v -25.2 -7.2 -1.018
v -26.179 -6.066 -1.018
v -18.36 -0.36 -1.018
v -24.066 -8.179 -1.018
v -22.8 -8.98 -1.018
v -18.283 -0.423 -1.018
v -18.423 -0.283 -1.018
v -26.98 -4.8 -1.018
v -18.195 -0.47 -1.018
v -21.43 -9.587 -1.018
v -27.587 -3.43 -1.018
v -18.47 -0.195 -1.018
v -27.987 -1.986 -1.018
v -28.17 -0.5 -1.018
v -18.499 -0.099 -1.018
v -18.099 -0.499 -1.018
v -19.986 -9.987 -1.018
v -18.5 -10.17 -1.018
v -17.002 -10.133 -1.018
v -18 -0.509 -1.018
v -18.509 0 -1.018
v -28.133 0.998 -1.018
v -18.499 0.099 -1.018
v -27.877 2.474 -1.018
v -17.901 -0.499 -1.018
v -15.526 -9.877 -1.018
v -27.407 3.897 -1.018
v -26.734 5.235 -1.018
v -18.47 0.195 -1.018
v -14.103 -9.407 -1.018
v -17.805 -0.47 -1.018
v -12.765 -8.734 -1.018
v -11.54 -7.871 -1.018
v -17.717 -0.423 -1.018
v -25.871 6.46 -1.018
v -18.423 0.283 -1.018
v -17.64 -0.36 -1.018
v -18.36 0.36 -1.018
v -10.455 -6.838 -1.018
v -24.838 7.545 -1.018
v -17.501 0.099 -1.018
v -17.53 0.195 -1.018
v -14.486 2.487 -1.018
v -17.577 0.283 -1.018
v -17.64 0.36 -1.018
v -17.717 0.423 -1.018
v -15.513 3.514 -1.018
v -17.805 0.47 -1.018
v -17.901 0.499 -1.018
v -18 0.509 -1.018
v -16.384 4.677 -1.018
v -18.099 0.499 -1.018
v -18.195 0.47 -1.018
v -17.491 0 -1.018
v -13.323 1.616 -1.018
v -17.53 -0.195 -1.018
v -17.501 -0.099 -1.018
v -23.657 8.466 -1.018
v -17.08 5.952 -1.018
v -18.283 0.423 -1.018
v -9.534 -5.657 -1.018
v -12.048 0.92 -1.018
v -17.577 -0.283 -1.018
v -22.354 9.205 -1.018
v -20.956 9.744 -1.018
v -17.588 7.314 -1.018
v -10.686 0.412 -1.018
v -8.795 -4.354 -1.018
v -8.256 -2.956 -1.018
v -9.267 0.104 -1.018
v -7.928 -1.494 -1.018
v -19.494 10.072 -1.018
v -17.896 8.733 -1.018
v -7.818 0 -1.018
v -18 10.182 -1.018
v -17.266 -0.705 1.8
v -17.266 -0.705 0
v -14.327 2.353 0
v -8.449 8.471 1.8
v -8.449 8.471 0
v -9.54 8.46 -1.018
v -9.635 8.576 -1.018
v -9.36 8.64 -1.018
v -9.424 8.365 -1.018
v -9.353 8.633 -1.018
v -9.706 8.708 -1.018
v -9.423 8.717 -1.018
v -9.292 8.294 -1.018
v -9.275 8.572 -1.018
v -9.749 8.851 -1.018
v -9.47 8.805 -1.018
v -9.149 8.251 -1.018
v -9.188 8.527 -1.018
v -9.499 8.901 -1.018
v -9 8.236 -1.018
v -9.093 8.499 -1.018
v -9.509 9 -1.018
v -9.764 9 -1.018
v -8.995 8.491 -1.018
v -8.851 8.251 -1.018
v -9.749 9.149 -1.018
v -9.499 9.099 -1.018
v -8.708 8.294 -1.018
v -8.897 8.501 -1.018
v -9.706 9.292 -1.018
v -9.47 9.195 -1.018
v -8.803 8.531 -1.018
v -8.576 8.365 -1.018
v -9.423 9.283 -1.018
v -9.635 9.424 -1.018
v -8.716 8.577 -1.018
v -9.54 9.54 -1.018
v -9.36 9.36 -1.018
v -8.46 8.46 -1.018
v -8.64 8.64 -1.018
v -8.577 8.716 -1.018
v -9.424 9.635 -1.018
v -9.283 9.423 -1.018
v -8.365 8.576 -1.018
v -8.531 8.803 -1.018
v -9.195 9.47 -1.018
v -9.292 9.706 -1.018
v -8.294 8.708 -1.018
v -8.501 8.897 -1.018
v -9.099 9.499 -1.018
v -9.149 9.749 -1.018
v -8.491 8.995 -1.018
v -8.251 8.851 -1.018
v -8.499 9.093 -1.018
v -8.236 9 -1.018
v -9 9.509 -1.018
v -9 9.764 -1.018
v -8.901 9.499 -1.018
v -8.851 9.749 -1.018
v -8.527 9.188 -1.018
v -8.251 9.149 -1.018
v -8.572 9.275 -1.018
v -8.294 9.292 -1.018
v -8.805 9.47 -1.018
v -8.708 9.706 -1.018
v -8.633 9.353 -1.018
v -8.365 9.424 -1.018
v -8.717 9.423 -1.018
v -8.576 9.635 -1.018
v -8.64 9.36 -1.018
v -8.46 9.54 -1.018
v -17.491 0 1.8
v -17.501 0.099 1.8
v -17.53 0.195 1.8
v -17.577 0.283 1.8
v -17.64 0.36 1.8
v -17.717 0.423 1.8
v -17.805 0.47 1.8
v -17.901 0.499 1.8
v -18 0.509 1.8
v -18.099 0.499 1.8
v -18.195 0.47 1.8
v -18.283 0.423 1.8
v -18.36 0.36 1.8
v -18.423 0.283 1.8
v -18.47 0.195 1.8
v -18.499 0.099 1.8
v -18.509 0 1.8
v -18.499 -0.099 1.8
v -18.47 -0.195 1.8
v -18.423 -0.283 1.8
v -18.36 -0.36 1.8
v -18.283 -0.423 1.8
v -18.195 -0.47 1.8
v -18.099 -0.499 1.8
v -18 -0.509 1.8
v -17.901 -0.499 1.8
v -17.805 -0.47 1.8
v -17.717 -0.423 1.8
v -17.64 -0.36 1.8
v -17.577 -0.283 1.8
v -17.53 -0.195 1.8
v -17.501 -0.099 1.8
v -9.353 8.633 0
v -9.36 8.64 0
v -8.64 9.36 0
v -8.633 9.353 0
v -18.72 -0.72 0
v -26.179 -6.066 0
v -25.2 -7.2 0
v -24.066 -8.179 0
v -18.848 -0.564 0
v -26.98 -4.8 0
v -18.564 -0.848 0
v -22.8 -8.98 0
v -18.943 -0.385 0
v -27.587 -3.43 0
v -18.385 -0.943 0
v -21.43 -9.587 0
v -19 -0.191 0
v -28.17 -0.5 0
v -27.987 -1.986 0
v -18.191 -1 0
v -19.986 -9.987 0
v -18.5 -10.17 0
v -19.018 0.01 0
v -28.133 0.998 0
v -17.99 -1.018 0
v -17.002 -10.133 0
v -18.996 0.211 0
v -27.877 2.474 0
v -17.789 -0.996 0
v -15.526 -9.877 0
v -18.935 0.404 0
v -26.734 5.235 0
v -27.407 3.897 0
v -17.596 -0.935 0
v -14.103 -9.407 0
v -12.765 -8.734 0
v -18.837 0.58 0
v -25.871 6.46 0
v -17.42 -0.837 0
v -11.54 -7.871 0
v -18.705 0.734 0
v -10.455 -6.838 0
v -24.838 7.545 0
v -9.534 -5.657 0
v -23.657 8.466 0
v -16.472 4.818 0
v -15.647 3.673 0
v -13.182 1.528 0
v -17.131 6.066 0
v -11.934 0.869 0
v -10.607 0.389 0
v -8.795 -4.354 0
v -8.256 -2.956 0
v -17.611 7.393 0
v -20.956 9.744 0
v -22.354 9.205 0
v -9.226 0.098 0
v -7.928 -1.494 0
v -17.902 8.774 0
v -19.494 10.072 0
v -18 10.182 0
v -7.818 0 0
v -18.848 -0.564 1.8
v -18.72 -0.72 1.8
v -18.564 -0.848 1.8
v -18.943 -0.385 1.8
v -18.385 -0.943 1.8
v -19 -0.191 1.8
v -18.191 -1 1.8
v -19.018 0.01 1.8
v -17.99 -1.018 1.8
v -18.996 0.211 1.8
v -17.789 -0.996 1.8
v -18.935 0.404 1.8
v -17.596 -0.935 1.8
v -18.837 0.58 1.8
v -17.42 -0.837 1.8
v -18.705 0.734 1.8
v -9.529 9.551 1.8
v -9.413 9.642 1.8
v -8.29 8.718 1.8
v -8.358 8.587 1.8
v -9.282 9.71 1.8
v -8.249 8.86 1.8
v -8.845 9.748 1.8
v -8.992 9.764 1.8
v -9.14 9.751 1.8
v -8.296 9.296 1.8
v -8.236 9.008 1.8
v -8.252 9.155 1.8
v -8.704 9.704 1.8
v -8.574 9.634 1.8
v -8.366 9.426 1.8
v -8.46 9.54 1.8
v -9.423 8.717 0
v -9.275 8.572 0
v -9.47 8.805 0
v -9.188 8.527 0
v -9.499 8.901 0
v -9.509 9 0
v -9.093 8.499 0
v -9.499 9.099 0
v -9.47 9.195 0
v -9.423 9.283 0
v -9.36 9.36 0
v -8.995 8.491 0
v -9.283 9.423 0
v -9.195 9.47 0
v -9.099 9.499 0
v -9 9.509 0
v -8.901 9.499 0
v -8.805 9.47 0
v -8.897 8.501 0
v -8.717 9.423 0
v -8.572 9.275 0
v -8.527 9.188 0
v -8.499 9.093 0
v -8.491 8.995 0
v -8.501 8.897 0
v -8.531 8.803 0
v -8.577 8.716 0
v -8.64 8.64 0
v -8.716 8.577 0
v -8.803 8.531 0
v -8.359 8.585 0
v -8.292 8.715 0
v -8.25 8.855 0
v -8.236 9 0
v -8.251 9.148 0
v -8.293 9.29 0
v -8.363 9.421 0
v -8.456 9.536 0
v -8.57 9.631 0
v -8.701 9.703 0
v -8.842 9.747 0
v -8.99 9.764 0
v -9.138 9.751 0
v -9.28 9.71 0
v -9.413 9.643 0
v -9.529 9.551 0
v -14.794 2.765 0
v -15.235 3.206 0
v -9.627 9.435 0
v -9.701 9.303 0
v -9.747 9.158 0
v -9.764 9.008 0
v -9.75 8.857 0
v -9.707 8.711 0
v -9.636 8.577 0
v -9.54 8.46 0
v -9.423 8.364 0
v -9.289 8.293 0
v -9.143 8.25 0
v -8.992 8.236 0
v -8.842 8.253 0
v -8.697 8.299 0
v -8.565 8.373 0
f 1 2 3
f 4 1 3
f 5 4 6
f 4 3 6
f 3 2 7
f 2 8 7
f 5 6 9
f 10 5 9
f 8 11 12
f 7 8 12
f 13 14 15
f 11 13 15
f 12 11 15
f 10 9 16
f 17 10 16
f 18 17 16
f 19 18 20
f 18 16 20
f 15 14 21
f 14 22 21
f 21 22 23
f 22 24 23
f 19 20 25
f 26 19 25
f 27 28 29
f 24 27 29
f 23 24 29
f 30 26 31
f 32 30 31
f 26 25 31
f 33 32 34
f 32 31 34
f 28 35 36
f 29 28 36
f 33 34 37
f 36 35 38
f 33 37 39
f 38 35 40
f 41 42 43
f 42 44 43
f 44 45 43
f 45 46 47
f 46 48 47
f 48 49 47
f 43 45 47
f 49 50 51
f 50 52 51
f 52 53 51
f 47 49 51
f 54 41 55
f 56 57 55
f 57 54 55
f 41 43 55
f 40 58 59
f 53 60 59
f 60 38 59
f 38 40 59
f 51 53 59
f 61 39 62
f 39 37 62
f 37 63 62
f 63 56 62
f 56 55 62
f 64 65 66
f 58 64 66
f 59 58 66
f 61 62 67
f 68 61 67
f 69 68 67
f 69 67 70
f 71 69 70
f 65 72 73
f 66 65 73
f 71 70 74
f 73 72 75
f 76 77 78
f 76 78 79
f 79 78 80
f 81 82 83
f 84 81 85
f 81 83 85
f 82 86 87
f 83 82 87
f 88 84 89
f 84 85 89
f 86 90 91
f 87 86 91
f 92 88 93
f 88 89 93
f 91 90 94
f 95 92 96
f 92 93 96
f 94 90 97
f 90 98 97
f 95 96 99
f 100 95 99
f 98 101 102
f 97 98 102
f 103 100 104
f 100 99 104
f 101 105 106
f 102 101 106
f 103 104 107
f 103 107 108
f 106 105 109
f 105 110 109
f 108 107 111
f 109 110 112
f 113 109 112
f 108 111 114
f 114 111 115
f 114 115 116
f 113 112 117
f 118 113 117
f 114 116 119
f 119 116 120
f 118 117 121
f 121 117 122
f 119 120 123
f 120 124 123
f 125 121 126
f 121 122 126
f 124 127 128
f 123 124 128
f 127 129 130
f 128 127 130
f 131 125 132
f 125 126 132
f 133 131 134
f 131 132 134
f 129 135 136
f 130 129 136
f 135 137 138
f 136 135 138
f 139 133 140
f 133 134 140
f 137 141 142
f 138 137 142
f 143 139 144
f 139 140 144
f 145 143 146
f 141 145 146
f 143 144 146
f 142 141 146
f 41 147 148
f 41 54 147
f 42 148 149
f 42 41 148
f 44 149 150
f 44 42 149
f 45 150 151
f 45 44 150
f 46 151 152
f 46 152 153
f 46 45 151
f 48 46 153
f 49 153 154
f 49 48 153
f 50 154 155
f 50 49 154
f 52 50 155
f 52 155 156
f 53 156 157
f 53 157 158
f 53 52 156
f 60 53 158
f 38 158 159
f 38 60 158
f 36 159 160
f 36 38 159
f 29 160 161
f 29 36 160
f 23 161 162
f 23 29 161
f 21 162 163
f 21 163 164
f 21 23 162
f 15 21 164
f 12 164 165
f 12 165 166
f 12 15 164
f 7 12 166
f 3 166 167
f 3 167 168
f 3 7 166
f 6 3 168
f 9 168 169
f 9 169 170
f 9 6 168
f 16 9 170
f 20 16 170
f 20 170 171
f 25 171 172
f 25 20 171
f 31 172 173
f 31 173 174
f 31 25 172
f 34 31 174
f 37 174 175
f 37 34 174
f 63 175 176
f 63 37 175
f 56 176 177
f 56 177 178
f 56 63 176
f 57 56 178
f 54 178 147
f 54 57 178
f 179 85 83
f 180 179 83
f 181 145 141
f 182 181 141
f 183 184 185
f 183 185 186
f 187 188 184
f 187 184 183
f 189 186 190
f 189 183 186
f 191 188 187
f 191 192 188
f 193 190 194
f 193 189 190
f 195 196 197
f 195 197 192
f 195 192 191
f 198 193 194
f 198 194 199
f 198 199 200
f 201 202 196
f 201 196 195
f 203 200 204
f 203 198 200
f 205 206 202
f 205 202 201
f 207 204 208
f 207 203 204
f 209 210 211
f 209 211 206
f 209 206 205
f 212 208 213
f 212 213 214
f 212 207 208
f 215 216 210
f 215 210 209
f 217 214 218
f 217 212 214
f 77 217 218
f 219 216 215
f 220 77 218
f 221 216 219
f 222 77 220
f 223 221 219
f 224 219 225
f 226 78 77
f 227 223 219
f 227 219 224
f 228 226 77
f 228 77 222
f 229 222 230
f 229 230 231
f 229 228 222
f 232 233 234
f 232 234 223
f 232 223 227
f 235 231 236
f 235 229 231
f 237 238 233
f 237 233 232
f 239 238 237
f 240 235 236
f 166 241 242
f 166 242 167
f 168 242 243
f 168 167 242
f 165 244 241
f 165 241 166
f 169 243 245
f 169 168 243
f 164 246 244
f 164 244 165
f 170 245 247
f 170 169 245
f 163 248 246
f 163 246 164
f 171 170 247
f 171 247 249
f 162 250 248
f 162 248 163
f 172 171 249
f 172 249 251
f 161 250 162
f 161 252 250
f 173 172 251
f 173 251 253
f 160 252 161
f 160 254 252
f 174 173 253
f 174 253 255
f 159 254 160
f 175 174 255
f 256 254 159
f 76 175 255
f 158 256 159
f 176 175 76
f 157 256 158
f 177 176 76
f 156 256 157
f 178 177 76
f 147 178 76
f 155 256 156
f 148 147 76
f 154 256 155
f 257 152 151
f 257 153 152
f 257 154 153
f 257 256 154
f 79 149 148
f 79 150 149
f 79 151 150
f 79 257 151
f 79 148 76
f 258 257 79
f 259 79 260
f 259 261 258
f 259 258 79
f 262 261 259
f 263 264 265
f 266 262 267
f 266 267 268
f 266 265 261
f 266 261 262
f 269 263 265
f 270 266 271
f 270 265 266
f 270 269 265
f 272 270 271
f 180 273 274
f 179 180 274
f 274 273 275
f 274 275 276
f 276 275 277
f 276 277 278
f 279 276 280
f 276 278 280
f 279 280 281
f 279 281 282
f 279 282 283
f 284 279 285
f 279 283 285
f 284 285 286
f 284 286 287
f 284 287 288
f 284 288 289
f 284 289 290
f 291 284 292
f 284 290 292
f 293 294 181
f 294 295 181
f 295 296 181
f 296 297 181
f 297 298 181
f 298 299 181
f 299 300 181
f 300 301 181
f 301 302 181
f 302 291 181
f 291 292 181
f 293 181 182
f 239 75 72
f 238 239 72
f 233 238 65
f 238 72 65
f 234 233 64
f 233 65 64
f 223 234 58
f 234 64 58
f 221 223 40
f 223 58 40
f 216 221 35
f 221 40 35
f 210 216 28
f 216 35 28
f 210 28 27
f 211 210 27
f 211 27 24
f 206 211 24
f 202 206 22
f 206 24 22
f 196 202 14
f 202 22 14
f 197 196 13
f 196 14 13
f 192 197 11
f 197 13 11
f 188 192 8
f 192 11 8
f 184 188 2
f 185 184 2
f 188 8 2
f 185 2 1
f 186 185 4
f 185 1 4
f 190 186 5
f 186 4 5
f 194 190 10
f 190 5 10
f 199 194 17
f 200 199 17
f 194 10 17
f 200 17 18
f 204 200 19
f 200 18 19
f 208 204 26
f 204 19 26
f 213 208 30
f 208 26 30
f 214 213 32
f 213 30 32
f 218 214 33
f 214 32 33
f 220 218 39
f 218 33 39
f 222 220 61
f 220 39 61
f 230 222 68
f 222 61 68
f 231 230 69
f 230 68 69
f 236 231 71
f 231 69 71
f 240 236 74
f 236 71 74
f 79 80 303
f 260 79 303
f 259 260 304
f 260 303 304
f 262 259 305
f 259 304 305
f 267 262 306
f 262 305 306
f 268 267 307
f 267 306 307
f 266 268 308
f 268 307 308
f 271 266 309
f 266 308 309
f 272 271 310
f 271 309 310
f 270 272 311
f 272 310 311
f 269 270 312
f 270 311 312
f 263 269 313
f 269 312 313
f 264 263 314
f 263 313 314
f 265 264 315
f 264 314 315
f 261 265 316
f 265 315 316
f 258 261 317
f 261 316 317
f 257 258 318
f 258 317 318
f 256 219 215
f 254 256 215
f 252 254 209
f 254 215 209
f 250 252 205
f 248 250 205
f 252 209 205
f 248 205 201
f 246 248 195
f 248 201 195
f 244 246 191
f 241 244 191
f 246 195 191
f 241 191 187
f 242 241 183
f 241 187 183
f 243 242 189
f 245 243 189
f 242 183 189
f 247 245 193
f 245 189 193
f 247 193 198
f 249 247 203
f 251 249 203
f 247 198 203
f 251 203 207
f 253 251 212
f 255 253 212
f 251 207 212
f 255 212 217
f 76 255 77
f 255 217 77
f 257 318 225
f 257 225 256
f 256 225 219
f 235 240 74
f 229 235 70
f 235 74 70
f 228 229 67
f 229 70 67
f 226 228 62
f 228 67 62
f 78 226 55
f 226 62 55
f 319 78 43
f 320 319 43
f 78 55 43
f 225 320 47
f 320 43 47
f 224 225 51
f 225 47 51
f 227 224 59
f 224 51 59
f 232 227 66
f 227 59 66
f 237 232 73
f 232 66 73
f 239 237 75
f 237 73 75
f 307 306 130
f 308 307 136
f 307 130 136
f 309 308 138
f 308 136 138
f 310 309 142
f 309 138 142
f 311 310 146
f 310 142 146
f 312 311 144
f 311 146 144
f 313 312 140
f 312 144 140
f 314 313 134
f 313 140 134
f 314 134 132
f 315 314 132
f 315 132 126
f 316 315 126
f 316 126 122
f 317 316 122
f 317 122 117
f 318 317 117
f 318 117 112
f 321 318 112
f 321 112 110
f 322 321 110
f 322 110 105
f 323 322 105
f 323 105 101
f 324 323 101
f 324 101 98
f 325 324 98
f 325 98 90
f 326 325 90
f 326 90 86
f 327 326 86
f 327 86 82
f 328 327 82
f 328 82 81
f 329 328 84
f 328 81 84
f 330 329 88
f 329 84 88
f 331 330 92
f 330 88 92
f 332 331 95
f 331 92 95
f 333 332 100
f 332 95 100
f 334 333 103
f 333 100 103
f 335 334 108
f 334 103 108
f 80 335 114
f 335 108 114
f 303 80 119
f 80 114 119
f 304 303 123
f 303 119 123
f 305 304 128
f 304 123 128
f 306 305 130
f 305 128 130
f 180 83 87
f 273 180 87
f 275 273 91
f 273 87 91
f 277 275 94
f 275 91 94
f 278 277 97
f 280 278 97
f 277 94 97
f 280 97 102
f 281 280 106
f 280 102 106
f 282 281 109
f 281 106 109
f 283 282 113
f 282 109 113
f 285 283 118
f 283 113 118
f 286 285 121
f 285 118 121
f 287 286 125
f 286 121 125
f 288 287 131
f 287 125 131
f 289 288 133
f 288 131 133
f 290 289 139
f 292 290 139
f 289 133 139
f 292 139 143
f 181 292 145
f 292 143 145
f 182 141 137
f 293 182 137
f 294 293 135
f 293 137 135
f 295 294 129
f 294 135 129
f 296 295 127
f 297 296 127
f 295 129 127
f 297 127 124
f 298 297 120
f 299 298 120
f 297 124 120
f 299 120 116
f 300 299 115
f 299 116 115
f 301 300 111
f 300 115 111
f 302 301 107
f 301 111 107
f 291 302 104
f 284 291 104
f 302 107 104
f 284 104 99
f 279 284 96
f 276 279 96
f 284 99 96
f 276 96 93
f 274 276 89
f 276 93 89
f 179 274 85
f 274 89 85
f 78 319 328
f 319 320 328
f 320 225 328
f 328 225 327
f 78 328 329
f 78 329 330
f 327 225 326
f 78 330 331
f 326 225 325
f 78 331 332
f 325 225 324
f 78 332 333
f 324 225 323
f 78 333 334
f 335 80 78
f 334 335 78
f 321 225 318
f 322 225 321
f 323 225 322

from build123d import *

# Parameters (mm, degrees)
SALIENTE_EXTRUIR2_START       = -1.018233765
SALIENTE_EXTRUIR2_OUTLINE_R   = 0.509116882
SALIENTE_EXTRUIR2_OUTLINE_R_2 = 0.763675324
SALIENTE_EXTRUIR2_DEPTH       = 1.018233765
CROQUIS2_R                    = 0.509116882
SALIENTE_EXTRUIR3_DEPTH       = 1.8


# Read off the part's stored shape, not the designer's step: Saliente-Extruir2
with BuildPart() as part:
    # Saliente-Extruir2 outline → Saliente-Extruir2 (new body)
    # profile 1 of 2: a face of its own
    with BuildSketch(Plane.XY.offset(SALIENTE_EXTRUIR2_START)):
        with BuildLine():
            ThreePointArc((-7.817662351, 0), (-15.017662351, 2.982337649), (-18, 10.182337649))
            ThreePointArc((-18, 10.182337649), (-25.2, -7.2), (-7.817662351, 0))
        make_face()
        with Locations((-18, 0)):
            Circle(SALIENTE_EXTRUIR2_OUTLINE_R, mode=Mode.SUBTRACT)
    # profile 2 of 2: a face of its own
    with BuildSketch(Plane.XY.offset(SALIENTE_EXTRUIR2_START)):
        with Locations((-9, 9)):
            Circle(SALIENTE_EXTRUIR2_OUTLINE_R_2)
        with BuildLine():
            Line((-8.64, 9.36), (-8.632797118, 9.352797118))
            ThreePointArc((-8.632797118, 9.352797118), (-8.64, 8.64), (-9.352727993, 8.632872007))
            Line((-9.352727993, 8.632872007), (-9.36, 8.64))
            ThreePointArc((-9.36, 8.64), (-9.36, 9.36), (-8.64, 9.36))
        make_face(mode=Mode.SUBTRACT)
    extrude(amount=SALIENTE_EXTRUIR2_DEPTH)

    # Croquis2 → Saliente-Extruir3 (add)
    with BuildSketch(Plane.XY):
        with BuildLine():
            Line((-17.265744014, -0.705455986), (-8.449308011, 8.470908011))
            ThreePointArc((-8.449308011, 8.470908011), (-8.46, 9.54), (-9.529091989, 9.550691989))
            Line((-9.529091989, 9.550691989), (-18.705455986, 0.734255986))
            ThreePointArc((-18.705455986, 0.734255986), (-18.72, -0.72), (-17.265744014, -0.705455986))
        make_face()
        with Locations((-18, 0)):
            Circle(CROQUIS2_R, mode=Mode.SUBTRACT)
    extrude(amount=SALIENTE_EXTRUIR3_DEPTH)


solid = part.part
